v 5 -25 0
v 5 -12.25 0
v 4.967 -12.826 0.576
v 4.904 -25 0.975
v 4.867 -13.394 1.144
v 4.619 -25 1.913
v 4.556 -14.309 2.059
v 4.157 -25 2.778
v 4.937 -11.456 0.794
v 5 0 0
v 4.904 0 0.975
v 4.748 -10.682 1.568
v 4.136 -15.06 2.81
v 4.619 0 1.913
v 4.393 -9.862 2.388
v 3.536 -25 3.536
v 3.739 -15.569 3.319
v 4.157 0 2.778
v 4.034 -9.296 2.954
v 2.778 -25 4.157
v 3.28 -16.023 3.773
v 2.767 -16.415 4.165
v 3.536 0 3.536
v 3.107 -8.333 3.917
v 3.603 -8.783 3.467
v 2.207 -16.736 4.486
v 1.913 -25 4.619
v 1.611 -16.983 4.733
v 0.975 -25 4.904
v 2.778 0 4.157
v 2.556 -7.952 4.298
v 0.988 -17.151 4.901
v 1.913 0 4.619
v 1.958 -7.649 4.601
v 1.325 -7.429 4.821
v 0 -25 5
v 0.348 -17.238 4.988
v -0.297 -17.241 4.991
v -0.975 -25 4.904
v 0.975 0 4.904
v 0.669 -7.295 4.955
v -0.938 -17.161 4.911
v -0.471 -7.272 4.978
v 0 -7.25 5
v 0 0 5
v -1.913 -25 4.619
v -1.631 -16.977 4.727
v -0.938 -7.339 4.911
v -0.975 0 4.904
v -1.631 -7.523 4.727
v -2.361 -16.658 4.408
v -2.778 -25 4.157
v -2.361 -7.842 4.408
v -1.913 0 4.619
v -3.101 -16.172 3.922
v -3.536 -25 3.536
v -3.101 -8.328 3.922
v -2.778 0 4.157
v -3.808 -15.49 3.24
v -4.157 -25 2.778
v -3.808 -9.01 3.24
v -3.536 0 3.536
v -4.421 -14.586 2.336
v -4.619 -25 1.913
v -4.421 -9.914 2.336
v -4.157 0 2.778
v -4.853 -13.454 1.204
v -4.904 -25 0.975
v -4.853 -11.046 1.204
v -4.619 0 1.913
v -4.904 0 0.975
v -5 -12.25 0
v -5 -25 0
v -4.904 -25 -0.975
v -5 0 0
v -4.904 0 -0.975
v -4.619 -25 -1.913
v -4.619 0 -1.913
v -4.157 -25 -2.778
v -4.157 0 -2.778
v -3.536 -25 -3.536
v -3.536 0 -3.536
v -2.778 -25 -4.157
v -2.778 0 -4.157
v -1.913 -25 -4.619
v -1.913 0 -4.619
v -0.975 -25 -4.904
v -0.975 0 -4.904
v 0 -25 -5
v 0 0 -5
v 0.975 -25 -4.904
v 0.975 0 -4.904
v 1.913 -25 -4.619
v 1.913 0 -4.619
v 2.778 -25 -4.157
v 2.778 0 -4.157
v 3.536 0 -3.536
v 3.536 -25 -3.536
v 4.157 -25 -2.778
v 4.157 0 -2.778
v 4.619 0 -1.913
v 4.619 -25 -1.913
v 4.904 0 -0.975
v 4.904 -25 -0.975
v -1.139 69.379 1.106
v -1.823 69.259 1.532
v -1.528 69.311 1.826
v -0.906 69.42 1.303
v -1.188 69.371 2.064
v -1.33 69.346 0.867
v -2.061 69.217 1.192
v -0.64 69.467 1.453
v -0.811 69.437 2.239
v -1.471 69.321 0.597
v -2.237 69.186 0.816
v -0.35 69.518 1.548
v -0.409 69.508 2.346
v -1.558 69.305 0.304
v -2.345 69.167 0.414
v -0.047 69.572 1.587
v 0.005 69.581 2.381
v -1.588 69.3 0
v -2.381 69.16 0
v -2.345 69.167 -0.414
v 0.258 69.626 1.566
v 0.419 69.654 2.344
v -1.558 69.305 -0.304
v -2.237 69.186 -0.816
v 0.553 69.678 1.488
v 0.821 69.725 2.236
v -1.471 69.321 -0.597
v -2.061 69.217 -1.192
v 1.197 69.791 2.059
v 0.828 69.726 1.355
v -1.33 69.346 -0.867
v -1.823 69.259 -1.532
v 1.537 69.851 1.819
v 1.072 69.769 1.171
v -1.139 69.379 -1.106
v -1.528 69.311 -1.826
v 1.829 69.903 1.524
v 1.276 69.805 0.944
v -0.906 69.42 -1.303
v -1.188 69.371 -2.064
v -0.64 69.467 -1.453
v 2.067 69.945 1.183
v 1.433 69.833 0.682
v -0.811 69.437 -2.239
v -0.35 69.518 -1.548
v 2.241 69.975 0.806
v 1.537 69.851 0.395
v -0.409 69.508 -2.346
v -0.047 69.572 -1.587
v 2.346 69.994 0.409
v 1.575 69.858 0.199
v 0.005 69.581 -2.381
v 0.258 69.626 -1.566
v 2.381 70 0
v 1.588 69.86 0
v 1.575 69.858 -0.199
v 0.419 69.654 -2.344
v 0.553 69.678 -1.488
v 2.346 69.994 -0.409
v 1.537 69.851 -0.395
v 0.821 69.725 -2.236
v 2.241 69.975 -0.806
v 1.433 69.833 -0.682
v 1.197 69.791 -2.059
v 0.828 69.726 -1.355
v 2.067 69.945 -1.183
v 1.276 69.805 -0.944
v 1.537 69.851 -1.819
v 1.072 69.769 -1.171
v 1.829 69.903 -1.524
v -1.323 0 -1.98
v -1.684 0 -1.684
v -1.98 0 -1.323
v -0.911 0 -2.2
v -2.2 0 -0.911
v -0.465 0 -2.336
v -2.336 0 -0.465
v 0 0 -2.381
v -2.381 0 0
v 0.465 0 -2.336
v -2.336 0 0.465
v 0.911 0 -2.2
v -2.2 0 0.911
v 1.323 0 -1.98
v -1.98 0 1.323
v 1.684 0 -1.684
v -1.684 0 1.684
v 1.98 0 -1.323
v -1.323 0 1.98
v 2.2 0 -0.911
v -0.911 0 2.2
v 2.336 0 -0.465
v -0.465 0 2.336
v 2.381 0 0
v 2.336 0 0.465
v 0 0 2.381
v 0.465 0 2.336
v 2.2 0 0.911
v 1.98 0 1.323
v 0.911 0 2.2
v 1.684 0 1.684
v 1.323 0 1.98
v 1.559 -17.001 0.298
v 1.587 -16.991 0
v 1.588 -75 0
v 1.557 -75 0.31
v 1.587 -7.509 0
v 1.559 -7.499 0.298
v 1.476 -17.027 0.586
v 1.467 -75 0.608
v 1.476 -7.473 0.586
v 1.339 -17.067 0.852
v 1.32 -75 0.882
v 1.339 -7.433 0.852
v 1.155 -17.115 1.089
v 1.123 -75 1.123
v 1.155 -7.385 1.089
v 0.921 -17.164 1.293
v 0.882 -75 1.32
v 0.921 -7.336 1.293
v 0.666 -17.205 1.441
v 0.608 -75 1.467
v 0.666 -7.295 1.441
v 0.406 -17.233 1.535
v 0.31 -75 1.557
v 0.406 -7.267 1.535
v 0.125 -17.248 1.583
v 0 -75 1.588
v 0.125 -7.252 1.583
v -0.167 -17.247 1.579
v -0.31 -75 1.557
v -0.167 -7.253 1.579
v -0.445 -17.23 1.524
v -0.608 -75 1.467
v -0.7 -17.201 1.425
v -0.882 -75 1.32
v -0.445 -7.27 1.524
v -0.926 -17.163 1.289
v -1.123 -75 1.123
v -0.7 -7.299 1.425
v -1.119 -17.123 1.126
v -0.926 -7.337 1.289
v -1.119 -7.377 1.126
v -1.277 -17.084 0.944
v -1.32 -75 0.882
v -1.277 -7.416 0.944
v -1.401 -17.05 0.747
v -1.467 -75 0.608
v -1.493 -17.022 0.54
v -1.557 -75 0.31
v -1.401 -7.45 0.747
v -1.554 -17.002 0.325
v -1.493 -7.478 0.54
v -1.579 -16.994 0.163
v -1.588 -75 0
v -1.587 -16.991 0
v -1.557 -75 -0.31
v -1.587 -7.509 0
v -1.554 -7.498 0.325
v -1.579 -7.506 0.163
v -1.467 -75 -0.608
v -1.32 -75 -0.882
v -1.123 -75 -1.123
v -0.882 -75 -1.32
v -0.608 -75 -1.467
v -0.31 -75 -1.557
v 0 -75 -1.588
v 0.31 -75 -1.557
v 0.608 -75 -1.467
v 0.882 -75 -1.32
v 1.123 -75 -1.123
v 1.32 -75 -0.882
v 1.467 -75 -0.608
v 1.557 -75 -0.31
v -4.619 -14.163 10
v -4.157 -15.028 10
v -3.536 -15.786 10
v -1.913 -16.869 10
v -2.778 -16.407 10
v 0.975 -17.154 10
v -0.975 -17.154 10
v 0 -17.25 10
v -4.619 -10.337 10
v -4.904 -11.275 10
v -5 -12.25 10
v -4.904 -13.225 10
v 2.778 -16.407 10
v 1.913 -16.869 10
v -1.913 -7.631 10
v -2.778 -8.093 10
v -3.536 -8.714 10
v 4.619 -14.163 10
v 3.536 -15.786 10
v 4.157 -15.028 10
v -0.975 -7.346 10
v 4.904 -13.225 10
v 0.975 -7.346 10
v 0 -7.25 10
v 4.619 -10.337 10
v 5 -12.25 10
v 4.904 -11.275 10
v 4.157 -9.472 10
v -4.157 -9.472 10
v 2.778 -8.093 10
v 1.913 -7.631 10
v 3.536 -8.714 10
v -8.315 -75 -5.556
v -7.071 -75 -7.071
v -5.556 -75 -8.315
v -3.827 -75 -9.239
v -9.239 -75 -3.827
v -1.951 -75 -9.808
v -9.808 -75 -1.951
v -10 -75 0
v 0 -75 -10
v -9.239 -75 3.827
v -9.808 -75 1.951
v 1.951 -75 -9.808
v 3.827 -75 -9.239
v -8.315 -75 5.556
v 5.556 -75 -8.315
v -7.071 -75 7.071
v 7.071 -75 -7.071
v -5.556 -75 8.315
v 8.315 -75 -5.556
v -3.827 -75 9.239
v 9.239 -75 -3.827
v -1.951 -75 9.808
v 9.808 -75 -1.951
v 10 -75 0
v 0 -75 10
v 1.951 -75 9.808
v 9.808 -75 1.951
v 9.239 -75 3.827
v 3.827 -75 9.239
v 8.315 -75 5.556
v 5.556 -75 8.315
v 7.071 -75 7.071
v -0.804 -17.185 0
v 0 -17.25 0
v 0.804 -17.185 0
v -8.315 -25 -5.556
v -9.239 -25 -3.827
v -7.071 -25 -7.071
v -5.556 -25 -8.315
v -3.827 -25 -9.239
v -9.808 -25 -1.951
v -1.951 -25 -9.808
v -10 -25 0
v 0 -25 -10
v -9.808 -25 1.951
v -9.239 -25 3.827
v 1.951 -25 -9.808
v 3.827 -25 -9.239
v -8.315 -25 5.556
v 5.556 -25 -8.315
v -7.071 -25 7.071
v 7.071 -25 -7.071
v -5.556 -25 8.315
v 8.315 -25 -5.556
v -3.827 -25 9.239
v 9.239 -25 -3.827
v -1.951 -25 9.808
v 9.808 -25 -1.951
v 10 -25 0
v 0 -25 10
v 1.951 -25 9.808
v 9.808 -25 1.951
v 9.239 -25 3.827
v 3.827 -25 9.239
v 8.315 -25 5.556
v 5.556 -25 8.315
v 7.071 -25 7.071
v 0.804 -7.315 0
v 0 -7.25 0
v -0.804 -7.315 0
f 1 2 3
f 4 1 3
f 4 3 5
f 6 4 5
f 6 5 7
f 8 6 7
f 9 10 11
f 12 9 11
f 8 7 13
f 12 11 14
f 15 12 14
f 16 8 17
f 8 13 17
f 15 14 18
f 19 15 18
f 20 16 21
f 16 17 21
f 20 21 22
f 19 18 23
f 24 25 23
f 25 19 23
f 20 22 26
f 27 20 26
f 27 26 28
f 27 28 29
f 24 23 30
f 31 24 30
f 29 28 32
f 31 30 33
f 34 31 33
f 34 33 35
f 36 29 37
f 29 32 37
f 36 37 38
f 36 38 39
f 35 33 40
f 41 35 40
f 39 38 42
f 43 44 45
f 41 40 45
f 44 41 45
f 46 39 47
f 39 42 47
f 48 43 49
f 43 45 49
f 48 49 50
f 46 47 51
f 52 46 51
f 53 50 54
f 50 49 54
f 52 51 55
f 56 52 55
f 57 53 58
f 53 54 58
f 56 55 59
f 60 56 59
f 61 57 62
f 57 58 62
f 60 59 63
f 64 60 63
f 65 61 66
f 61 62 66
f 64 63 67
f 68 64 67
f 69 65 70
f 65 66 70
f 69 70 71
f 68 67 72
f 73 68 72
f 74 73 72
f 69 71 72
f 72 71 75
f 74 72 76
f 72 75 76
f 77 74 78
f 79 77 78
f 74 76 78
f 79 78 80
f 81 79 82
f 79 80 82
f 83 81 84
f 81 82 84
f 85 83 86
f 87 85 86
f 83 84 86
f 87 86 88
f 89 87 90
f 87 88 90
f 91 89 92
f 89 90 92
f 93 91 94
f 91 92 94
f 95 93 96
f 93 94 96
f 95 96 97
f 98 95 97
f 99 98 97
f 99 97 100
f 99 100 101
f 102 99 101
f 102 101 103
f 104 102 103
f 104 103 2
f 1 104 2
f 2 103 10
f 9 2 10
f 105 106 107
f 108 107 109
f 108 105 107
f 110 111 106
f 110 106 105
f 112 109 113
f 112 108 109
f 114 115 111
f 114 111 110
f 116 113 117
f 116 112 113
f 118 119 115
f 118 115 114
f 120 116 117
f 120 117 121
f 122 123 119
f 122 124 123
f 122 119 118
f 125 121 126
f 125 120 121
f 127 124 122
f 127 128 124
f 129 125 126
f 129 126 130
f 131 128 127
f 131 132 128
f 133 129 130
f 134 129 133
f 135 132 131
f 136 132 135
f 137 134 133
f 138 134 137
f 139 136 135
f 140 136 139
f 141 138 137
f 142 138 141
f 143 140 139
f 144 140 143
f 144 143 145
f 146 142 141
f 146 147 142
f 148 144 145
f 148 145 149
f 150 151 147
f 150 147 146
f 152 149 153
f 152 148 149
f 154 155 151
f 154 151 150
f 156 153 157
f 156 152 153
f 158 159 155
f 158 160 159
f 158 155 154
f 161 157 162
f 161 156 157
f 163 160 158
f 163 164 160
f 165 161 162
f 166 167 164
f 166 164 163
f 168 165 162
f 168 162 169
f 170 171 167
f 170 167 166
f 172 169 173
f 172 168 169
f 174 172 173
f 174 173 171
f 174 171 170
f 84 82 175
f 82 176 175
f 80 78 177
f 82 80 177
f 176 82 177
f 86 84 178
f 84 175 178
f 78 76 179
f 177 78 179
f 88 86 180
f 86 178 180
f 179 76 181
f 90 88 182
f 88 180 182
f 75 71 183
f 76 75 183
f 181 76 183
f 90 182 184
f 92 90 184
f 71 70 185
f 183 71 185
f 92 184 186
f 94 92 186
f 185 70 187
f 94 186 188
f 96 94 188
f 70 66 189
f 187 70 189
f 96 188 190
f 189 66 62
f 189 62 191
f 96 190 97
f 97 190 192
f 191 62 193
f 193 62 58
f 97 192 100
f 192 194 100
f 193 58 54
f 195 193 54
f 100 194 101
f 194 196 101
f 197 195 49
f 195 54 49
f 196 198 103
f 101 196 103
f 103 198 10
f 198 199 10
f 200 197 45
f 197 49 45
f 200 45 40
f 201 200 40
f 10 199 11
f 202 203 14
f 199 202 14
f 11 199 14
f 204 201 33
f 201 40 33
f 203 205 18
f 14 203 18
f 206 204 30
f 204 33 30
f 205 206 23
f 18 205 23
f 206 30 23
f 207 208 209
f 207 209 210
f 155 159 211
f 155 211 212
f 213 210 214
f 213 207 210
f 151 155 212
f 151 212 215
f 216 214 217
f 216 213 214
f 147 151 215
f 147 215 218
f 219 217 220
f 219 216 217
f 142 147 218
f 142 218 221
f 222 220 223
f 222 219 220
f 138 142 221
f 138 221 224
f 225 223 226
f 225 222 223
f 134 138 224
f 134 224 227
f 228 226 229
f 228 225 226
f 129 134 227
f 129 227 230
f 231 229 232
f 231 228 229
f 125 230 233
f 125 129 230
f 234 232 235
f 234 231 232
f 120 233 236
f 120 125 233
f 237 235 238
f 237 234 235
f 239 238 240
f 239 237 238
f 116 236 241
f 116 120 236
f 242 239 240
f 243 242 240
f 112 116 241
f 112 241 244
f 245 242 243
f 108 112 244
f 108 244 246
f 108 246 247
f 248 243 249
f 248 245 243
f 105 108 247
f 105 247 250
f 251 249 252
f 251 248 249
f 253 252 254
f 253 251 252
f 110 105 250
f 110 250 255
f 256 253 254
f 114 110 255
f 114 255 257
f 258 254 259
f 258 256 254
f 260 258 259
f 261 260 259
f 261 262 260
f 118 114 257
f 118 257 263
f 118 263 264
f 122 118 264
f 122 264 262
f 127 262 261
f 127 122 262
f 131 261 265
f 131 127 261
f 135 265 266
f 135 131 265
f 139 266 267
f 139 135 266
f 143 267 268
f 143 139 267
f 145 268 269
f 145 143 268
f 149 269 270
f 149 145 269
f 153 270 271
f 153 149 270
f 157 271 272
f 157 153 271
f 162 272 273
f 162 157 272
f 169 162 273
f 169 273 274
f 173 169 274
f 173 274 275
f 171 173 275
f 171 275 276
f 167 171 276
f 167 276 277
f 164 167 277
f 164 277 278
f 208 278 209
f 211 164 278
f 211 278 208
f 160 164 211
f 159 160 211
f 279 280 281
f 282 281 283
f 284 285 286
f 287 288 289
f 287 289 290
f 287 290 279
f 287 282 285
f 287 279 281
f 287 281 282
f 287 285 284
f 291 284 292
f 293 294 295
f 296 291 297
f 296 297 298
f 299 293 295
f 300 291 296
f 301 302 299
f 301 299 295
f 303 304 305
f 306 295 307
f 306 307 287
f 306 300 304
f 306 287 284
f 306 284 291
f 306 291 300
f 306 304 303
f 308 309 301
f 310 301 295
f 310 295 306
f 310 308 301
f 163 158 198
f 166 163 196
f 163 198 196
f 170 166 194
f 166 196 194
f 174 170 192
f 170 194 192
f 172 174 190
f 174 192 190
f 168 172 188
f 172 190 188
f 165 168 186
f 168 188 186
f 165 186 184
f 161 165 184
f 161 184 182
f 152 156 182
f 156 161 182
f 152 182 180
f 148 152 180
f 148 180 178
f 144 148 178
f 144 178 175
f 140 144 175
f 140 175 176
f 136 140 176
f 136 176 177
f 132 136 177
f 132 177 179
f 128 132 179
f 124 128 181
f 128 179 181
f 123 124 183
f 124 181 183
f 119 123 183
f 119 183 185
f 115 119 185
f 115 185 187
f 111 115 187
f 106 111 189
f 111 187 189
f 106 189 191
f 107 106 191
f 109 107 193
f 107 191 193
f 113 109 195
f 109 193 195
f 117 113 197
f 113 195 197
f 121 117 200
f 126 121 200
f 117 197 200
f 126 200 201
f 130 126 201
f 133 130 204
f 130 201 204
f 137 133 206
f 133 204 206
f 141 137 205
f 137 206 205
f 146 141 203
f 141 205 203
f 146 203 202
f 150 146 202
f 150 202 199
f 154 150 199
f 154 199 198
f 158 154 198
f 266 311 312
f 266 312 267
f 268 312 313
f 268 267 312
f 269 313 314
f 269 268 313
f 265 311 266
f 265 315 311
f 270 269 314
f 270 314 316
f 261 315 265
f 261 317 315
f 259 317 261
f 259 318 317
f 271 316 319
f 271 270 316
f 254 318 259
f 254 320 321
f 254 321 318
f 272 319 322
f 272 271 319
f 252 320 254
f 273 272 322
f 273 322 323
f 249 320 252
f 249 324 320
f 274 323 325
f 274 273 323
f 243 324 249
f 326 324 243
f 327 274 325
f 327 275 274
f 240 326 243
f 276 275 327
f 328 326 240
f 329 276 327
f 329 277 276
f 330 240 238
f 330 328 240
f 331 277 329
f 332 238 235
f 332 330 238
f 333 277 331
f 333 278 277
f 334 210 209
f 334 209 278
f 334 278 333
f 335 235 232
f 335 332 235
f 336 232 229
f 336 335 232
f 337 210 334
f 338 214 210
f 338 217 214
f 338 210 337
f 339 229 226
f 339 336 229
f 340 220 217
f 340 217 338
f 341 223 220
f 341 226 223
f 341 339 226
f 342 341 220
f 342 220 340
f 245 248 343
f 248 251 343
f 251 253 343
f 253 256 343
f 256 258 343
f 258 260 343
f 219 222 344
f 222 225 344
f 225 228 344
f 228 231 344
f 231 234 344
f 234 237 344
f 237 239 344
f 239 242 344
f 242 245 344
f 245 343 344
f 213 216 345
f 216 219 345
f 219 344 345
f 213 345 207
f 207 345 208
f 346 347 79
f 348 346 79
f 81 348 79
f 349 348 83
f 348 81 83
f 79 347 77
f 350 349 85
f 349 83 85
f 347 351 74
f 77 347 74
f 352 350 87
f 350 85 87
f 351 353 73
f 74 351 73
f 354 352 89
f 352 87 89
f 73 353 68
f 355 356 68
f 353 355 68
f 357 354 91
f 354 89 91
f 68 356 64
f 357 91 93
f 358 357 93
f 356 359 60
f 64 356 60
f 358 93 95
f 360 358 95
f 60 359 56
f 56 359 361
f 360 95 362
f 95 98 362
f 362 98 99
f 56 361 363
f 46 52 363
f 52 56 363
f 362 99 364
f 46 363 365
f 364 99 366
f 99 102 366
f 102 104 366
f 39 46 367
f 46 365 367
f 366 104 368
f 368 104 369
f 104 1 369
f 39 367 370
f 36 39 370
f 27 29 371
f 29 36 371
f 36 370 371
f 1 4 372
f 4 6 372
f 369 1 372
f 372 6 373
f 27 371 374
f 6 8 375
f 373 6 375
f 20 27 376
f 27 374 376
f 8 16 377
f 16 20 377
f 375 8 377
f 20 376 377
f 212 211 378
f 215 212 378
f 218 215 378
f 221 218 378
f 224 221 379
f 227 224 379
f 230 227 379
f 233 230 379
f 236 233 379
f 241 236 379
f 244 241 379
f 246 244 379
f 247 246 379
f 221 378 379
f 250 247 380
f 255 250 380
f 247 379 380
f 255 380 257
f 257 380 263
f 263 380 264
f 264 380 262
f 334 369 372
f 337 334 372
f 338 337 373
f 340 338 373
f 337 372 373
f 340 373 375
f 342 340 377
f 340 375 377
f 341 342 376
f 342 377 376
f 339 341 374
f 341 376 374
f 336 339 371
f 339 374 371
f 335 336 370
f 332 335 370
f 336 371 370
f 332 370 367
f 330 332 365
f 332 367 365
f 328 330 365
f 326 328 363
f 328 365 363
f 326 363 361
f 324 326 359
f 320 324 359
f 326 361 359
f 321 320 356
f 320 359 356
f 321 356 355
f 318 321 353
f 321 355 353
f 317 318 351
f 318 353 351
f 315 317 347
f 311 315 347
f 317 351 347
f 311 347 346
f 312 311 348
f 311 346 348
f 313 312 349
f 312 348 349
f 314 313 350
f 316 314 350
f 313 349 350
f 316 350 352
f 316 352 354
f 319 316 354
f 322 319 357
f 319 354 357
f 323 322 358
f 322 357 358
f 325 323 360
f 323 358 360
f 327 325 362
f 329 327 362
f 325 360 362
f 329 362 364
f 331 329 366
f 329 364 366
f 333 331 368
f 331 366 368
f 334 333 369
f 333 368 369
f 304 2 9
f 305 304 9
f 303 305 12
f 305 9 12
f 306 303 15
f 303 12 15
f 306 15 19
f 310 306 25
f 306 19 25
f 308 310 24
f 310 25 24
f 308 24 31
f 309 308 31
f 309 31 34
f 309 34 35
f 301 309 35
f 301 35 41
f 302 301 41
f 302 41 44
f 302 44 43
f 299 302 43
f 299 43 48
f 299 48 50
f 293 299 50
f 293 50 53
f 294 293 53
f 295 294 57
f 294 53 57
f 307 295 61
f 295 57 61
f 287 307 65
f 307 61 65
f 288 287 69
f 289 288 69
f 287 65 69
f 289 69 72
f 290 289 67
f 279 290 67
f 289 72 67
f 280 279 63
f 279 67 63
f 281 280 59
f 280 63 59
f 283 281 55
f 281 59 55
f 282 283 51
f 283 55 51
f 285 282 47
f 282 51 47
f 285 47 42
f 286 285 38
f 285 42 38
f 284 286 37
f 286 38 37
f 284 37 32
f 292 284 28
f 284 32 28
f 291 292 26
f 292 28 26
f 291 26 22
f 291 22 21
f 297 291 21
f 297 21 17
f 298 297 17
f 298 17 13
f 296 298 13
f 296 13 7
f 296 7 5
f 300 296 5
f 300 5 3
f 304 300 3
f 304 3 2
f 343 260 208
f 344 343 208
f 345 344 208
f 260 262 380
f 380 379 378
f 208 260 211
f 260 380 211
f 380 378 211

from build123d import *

# Parameters (mm, degrees)
CROQUIS1_R                 = 2.38135
CROQUIS1_R_2               = 1.5875
SALIENTE_EXTRUIR1_DEPTH    = 70
CORTAR_EXTRUIR1_DEPTH      = 3.38135
CORTAR_EXTRUIR1_DEPTH_BACK = 3.38135
CROQUIS3_R                 = 5
CROQUIS3_R_2               = 1.5875
SALIENTE_EXTRUIR2_DEPTH    = 25
CROQUIS4_R                 = 10
CROQUIS4_R_2               = 1.5875
SALIENTE_EXTRUIR3_DEPTH    = 50
CROQUIS5_R                 = 5
SALIENTE_EXTRUIR4_DEPTH    = 10


with BuildPart() as part:
    # Croquis1 → Saliente-Extruir1 (new body)
    with BuildSketch(Plane(origin=(0, 0, 0), x_dir=(1, 0, 0), z_dir=(0, 1, 0))):
        Circle(CROQUIS1_R)
        Circle(CROQUIS1_R_2, mode=Mode.SUBTRACT)
    extrude(amount=SALIENTE_EXTRUIR1_DEPTH)

    # Croquis2 → Cortar-Extruir1 (cut, two sides)
    with BuildSketch(Plane.XY) as cortar_extruir1_sk:
        Polygon((2.38135, 70), (-2.38135, 70), (-2.38135, 69.160207489), align=None)
    extrude(amount=CORTAR_EXTRUIR1_DEPTH, mode=Mode.SUBTRACT)
    extrude(cortar_extruir1_sk.sketch, amount=-CORTAR_EXTRUIR1_DEPTH_BACK, mode=Mode.SUBTRACT)

    # Croquis3 → Saliente-Extruir2 (add)
    with BuildSketch(Plane.XZ):
        Circle(CROQUIS3_R)
        Circle(CROQUIS3_R_2, mode=Mode.SUBTRACT)
    extrude(amount=SALIENTE_EXTRUIR2_DEPTH)

    # Croquis4 → Saliente-Extruir3 (add)
    with BuildSketch(Plane.XZ.offset(25)):
        Circle(CROQUIS4_R)
        Circle(CROQUIS4_R_2, mode=Mode.SUBTRACT)
    extrude(amount=SALIENTE_EXTRUIR3_DEPTH)

    # Croquis5 → Saliente-Extruir4 (add)
    with BuildSketch(Plane.XY):
        with Locations((0, -12.25)):
            Circle(CROQUIS5_R)
    extrude(amount=SALIENTE_EXTRUIR4_DEPTH)


solid = part.part
